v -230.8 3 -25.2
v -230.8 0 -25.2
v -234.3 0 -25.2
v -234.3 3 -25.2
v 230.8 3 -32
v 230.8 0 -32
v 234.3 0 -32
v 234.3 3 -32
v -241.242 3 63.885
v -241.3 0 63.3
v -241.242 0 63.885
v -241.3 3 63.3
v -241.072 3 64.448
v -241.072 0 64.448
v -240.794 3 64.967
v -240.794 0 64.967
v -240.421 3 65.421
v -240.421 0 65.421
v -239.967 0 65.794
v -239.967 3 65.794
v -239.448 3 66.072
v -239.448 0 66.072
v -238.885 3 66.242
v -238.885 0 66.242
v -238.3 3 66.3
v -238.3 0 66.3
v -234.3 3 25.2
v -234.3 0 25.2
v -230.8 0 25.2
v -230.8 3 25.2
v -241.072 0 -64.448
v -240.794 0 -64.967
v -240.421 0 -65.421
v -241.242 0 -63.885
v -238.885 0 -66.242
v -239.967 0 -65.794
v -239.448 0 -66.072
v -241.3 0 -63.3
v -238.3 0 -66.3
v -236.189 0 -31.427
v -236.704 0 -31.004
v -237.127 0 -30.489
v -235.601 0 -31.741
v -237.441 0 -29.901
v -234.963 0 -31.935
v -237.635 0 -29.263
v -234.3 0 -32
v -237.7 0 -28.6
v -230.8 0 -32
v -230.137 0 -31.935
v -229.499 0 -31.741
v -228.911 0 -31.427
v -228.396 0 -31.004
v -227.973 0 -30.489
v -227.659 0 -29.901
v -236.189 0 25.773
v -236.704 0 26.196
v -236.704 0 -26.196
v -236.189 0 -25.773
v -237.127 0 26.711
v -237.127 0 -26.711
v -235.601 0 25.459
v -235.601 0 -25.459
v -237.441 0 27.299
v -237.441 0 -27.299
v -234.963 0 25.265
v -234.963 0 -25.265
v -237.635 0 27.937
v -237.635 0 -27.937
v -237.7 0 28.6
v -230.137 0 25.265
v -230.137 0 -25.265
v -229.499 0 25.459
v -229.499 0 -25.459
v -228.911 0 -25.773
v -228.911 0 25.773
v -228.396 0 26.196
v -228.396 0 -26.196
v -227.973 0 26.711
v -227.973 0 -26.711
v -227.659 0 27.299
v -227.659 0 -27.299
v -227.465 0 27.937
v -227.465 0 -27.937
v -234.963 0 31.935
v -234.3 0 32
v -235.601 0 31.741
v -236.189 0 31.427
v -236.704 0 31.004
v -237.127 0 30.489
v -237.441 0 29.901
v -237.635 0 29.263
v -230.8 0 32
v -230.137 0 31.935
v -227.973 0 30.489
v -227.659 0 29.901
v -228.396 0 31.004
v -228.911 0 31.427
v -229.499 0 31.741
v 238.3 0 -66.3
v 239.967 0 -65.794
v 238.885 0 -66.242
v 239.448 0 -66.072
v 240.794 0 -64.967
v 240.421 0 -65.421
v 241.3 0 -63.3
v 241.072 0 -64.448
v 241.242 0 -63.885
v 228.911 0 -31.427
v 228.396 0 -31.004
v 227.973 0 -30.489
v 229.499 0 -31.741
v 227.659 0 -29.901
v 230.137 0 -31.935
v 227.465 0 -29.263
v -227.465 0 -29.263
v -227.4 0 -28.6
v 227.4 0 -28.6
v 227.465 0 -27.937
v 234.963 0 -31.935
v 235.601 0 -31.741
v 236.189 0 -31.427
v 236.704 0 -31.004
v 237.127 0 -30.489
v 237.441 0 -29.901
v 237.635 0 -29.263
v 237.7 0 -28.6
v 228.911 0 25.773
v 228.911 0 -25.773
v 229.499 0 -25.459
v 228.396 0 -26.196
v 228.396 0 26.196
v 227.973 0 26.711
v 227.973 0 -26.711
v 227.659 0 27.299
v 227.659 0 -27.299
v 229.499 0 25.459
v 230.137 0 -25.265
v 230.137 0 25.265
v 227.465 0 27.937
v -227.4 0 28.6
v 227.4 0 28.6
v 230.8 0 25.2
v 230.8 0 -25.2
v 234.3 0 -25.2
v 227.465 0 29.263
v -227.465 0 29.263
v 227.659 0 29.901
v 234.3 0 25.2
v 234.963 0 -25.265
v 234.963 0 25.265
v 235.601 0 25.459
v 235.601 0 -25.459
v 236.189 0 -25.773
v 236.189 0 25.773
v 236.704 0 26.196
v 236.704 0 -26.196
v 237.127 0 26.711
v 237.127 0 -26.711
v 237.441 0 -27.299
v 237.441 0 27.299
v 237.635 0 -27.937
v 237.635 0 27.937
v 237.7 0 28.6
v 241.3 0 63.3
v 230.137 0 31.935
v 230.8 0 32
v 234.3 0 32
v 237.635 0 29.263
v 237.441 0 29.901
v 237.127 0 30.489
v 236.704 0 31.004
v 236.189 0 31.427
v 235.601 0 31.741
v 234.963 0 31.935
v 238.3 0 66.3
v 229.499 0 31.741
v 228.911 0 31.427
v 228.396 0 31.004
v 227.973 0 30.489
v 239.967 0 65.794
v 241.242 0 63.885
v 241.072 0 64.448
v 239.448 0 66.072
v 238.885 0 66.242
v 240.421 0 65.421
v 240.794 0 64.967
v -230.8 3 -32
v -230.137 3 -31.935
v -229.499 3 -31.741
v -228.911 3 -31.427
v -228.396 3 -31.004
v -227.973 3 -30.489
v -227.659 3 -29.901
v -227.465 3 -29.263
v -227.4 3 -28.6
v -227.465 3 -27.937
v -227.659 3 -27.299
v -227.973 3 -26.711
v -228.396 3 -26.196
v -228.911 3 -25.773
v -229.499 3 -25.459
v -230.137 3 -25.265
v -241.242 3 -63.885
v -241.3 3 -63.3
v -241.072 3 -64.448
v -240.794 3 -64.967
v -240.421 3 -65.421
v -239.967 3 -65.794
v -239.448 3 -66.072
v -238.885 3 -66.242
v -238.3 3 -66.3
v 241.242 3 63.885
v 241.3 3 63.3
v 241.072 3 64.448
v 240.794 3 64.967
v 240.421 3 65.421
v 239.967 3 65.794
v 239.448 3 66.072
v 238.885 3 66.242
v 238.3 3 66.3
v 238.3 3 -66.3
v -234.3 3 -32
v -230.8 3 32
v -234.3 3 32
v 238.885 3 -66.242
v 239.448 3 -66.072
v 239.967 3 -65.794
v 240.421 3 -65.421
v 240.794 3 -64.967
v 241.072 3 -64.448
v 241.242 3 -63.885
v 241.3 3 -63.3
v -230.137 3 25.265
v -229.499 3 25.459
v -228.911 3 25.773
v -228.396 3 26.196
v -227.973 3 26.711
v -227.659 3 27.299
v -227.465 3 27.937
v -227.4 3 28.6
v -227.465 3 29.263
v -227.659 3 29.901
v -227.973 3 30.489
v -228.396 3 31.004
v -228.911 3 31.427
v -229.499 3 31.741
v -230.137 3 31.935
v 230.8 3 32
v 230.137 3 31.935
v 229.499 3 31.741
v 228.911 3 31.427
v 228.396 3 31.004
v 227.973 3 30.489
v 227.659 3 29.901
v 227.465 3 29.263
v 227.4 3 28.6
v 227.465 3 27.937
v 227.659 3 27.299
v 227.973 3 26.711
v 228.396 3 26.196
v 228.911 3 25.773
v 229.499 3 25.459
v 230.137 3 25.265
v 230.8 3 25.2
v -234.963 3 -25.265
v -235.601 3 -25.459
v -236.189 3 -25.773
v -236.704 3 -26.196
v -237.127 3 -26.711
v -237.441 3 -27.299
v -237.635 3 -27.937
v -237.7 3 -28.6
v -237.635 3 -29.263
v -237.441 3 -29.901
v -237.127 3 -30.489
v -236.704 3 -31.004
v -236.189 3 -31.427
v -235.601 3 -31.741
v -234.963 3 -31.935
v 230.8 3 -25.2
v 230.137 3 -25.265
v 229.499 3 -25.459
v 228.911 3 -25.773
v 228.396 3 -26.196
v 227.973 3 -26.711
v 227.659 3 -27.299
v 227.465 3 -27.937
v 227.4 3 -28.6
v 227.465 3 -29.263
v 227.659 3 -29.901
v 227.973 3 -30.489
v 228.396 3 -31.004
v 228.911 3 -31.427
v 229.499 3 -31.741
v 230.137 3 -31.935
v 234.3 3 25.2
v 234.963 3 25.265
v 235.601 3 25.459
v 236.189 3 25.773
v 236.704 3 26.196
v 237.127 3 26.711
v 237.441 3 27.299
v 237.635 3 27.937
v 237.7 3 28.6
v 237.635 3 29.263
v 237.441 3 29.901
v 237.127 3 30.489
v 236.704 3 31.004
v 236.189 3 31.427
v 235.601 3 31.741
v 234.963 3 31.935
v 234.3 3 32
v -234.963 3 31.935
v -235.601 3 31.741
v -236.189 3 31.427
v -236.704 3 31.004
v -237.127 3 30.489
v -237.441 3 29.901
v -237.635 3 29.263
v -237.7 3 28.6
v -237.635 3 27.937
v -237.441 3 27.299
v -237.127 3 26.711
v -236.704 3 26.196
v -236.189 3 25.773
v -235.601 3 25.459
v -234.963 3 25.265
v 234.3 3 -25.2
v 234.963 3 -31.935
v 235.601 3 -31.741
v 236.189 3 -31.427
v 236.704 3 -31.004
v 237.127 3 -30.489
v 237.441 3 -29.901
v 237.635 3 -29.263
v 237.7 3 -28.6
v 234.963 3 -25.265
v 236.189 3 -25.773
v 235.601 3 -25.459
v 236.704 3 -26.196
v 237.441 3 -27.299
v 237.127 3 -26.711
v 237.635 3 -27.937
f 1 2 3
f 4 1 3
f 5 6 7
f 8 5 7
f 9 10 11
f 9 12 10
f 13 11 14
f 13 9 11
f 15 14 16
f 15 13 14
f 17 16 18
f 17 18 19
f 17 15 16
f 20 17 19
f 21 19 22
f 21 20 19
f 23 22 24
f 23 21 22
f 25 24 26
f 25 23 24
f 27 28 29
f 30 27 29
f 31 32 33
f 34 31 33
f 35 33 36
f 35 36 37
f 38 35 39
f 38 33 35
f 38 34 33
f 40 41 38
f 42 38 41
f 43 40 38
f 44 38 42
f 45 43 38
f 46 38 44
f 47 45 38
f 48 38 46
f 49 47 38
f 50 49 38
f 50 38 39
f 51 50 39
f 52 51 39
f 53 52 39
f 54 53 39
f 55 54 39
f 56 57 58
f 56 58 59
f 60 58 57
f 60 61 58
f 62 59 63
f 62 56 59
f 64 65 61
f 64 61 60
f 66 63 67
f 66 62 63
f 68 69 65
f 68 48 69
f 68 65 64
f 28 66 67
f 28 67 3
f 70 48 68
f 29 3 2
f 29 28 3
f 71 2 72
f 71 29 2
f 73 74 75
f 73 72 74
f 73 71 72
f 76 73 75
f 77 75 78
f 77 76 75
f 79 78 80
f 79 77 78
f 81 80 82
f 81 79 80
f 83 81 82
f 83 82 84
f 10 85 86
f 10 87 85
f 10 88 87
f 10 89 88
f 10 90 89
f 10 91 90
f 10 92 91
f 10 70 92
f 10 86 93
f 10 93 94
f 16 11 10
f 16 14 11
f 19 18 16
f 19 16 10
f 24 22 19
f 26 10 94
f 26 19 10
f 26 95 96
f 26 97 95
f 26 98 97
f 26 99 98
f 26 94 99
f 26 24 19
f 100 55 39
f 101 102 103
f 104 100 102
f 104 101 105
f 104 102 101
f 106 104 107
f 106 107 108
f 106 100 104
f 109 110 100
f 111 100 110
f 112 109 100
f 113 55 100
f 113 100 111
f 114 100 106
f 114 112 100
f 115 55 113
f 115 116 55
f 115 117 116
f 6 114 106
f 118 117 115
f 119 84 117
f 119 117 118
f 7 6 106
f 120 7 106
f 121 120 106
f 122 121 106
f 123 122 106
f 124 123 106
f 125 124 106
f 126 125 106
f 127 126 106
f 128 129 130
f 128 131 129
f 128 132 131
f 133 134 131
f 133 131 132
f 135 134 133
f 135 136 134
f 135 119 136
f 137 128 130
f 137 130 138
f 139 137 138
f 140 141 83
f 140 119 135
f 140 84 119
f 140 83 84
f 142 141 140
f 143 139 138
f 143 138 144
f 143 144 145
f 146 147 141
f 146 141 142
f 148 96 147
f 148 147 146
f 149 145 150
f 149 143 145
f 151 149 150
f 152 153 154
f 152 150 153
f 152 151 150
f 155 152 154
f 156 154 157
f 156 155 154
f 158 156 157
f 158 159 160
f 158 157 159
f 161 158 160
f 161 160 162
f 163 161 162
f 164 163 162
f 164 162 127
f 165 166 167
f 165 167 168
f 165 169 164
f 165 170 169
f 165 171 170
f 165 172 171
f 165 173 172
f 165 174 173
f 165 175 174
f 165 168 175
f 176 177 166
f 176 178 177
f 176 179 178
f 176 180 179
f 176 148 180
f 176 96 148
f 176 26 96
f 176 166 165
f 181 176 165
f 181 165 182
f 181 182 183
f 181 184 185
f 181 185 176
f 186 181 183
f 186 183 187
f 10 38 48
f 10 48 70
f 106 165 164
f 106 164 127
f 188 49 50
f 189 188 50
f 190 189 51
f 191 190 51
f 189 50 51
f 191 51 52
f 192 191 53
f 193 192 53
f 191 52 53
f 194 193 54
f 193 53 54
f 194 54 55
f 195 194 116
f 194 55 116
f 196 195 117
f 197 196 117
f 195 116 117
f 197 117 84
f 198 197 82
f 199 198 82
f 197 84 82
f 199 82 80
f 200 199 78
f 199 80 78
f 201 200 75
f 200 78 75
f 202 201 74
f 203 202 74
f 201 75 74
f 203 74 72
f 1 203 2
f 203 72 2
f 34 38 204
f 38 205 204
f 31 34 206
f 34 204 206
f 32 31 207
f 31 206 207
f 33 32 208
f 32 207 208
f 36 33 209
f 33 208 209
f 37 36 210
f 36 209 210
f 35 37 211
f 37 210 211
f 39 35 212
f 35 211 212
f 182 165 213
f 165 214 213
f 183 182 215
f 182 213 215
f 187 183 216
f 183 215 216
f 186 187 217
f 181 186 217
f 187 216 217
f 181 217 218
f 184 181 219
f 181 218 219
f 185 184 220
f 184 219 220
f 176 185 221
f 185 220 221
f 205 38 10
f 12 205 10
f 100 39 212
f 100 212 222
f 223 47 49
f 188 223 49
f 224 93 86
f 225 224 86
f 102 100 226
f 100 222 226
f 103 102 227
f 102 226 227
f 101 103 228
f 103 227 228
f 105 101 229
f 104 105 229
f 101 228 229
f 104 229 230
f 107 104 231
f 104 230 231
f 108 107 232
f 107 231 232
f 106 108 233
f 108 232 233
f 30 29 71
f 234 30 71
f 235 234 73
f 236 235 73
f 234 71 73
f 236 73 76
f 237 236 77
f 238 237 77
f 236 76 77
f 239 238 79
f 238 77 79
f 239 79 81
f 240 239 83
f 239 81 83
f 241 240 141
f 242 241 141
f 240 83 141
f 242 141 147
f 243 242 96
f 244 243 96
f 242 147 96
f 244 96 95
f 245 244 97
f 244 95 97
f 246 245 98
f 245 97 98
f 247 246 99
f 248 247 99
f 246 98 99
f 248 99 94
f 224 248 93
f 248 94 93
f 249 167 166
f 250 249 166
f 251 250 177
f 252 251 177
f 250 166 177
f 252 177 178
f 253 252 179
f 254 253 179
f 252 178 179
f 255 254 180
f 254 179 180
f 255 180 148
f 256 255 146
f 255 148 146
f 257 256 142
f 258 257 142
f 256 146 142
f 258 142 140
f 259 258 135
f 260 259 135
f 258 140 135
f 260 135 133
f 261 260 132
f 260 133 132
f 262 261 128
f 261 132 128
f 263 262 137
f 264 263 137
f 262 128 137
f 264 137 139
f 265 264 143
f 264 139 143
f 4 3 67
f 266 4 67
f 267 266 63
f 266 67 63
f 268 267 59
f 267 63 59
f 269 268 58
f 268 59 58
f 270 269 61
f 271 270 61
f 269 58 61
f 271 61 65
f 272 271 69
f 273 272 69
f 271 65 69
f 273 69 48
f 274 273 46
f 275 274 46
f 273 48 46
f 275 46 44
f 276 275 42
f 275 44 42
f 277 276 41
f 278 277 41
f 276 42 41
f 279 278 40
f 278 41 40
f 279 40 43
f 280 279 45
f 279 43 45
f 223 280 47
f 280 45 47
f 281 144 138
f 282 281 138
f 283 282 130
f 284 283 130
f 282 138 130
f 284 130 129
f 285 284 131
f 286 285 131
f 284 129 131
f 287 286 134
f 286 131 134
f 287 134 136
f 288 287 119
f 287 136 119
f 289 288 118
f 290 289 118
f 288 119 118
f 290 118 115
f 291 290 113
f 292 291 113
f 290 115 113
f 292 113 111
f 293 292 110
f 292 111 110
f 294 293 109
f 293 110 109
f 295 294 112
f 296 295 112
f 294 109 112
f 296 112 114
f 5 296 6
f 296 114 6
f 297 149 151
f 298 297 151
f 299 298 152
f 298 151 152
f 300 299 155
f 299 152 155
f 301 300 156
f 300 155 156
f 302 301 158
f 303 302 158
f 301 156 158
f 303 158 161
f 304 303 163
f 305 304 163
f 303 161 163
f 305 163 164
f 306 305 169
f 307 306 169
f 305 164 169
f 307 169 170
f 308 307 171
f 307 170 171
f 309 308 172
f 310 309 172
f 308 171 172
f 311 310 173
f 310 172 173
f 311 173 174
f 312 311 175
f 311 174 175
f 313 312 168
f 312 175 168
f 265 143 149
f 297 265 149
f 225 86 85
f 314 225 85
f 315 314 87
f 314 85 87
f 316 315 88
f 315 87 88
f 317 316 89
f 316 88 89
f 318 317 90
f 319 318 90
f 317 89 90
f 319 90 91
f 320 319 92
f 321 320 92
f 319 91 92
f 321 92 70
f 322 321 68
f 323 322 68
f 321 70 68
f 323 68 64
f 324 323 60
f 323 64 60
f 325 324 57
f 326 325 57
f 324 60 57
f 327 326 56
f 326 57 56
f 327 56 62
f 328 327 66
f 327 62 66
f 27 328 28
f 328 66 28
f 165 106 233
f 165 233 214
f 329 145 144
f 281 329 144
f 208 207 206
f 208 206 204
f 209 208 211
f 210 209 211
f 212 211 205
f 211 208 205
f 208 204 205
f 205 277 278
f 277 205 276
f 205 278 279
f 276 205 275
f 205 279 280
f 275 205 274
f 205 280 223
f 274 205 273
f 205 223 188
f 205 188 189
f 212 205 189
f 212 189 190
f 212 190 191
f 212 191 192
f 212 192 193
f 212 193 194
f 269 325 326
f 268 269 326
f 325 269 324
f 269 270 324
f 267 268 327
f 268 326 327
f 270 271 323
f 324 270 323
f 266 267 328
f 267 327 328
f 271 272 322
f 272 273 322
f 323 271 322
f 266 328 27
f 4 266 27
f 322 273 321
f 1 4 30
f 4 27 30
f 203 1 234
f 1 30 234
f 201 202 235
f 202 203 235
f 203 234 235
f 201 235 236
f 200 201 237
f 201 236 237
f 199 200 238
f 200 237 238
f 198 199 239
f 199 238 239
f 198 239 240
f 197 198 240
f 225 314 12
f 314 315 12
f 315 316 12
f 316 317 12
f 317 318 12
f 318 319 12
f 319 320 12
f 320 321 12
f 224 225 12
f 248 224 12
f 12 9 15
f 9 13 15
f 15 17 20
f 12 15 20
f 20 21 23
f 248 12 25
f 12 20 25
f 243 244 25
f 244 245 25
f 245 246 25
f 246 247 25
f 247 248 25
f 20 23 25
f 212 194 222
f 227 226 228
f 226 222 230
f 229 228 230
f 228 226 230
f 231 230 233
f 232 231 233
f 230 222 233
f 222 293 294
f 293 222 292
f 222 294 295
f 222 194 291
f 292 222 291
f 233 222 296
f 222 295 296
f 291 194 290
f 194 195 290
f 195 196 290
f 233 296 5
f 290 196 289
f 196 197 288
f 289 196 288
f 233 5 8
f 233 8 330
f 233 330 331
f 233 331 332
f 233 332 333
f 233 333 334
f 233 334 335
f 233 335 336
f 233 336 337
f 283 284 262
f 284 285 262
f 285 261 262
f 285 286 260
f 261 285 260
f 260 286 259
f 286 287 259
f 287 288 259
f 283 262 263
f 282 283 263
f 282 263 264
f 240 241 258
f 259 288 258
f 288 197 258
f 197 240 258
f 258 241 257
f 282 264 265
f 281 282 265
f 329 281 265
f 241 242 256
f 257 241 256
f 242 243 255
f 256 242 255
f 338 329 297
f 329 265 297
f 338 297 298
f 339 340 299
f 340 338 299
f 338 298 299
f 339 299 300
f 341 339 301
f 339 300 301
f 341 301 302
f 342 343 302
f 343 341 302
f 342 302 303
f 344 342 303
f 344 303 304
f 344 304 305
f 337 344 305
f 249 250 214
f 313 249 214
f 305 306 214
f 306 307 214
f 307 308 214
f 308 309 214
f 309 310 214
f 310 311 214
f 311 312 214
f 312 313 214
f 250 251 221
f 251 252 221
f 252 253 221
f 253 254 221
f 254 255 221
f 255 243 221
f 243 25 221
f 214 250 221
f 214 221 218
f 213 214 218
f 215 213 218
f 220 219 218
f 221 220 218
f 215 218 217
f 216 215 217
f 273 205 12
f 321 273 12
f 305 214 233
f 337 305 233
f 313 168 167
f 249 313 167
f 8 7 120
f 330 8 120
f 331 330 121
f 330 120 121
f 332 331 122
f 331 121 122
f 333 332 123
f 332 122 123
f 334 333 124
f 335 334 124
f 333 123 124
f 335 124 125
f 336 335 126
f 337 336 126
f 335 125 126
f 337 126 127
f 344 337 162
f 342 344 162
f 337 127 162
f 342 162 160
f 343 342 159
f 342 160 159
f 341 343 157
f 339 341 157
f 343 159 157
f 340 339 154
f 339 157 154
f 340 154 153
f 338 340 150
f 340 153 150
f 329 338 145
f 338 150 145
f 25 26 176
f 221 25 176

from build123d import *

# Parameters (mm, degrees)
F0_W     = 482.6
F0_H     = 132.6
F1_DEPTH = 3
F2_R     = 3
F4_DEPTH = 3


with BuildPart() as f1:
    # F0 (on Front) → F1 (new body)
    with BuildSketch(Plane.XZ):
        Rectangle(F0_W, F0_H)
    extrude(amount=-F1_DEPTH)

    # F2
    f2_edges = [f1.edges().sort_by_distance(p)[0] for p in [
        (-241.3, 1.5, 66.3),
        (241.3, 1.5, 66.3),
        (241.3, 1.5, -66.3),
        (-241.3, 1.5, -66.3),
    ]]
    fillet(f2_edges, radius=F2_R)

    # F3 (on Front) → F4 (cut, through all)
    with BuildSketch(Plane.XZ):
        with BuildLine():
            Line((-234.3, 25.2), (-230.8, 25.2))
            ThreePointArc((-230.8, 25.2), (-227.4, 28.6), (-230.8, 32))
            Line((-230.8, 32), (-234.3, 32))
            ThreePointArc((-234.3, 32), (-237.7, 28.6), (-234.3, 25.2))
        make_face()
        with BuildLine():
            ThreePointArc((230.8, 32), (227.4, 28.6), (230.8, 25.2))
            Line((230.8, 25.2), (234.3, 25.2))
            ThreePointArc((234.3, 25.2), (237.7, 28.6), (234.3, 32))
            Line((234.3, 32), (230.8, 32))
        make_face()
        with BuildLine():
            Line((230.8, -32), (234.3, -32))
            ThreePointArc((234.3, -32), (237.7, -28.6), (234.3, -25.2))
            Line((234.3, -25.2), (230.8, -25.2))
            ThreePointArc((230.8, -25.2), (227.4, -28.6), (230.8, -32))
        make_face()
        with BuildLine():
            ThreePointArc((-230.8, -32), (-227.4, -28.6), (-230.8, -25.2))
            Line((-230.8, -25.2), (-234.3, -25.2))
            ThreePointArc((-234.3, -25.2), (-237.7, -28.6), (-234.3, -32))
            Line((-234.3, -32), (-230.8, -32))
        make_face()
    extrude(amount=-F4_DEPTH, mode=Mode.SUBTRACT)


solid = f1.part
